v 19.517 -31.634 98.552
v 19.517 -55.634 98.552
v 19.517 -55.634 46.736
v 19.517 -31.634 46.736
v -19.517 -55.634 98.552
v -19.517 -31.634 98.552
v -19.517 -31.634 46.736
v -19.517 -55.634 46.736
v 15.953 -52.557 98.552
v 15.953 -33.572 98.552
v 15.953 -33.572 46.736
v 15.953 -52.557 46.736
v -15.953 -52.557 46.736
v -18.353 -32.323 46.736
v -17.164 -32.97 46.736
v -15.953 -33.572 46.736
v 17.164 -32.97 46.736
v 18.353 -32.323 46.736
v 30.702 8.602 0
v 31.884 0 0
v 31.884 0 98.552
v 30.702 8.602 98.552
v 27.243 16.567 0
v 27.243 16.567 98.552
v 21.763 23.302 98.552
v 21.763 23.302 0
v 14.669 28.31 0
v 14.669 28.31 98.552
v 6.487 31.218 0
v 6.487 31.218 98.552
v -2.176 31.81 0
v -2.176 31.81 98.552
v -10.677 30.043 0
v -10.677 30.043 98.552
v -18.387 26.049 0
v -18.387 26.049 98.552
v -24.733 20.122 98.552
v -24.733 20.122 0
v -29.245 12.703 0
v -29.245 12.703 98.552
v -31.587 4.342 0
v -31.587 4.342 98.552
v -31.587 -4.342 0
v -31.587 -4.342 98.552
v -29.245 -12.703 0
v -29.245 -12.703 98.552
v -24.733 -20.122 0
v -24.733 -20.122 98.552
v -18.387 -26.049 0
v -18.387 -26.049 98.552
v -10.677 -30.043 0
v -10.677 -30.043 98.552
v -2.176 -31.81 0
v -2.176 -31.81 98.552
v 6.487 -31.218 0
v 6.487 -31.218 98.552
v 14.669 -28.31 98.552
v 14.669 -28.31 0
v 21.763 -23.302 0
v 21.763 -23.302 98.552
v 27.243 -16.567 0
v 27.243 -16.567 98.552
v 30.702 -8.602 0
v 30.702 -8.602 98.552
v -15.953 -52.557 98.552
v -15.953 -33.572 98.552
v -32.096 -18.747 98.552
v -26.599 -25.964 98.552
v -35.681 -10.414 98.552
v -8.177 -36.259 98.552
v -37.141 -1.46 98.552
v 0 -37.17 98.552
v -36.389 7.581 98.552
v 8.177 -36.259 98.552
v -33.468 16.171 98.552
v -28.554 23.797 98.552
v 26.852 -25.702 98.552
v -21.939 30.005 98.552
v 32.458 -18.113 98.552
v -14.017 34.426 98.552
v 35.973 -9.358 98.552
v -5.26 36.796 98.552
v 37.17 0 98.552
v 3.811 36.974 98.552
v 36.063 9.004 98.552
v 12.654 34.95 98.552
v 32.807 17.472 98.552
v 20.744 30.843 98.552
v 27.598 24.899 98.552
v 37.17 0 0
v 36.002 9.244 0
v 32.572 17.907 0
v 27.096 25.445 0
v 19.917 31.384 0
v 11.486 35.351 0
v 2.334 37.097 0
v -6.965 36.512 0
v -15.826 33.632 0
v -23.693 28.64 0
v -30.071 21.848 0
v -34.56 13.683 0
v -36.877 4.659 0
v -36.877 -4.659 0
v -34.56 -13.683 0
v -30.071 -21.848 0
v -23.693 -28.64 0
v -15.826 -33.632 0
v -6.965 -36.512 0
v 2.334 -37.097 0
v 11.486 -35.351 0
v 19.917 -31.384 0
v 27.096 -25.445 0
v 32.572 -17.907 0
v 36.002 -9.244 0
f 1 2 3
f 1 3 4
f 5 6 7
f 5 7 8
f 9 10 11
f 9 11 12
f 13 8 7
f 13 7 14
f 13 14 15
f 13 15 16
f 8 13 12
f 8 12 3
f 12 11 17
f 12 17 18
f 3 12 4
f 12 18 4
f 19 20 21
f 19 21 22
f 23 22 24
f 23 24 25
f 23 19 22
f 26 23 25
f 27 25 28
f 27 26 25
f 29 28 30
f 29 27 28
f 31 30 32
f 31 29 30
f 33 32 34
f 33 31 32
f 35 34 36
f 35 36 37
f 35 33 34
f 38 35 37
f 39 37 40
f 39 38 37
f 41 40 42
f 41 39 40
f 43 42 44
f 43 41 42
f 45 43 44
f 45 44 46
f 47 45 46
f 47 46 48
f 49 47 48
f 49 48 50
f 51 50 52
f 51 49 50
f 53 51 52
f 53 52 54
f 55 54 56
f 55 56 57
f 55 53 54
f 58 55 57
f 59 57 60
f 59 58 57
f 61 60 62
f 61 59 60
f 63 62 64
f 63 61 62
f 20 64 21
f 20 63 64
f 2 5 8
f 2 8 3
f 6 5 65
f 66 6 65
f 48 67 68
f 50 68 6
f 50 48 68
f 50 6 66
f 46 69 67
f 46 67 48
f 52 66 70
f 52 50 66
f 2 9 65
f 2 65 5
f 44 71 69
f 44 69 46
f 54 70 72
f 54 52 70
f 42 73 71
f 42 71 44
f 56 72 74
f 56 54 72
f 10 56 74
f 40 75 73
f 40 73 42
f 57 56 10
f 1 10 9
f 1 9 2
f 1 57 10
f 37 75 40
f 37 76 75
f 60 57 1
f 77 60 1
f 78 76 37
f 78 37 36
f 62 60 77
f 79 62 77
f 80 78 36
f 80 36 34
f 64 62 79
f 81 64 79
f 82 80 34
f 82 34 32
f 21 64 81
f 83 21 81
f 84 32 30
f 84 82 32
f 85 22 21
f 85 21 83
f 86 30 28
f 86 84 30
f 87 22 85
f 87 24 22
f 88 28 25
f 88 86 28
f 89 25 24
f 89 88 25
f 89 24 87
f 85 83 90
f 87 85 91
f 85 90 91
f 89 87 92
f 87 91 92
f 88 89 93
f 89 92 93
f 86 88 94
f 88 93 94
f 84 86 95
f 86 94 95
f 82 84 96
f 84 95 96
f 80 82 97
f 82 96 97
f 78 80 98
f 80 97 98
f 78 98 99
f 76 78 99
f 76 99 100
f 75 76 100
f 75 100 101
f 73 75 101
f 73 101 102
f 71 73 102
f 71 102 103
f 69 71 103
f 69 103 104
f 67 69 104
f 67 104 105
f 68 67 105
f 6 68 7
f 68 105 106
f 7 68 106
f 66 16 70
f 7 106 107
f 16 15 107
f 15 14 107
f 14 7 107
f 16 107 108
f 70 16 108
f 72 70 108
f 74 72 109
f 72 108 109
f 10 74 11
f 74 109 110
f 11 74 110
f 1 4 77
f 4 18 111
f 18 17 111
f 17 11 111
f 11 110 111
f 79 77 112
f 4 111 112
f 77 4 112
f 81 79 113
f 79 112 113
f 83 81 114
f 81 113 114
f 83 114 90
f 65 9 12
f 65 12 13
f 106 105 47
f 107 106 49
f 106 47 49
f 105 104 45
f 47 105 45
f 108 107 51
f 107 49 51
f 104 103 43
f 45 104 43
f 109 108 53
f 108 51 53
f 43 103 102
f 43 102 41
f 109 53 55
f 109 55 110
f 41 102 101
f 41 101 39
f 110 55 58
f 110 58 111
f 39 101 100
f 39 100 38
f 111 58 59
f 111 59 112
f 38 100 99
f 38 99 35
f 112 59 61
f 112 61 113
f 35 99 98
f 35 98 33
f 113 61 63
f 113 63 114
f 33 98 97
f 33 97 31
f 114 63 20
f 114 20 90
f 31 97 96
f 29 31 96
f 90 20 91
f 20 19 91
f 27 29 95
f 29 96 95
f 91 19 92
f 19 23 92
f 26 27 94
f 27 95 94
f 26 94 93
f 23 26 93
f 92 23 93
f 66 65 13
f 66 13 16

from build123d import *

# Parameters (mm, degrees)
F0_R     = 37.170022
F0_R_2   = 31.88441
F1_DEPTH = 98.552
F3_DEPTH = 51.816


with BuildPart() as f1:
    # F0 (on Top) → F1 (new body)
    with BuildSketch(Plane.XY):
        Circle(F0_R)
        Circle(F0_R_2, mode=Mode.SUBTRACT)
    extrude(amount=F1_DEPTH)

    # F2 (on face) → F3 (join)
    with BuildSketch(Plane.XY.offset(98.552)):
        with BuildLine():
            Line((-19.516608, -55.634487), (19.516608, -55.634487))
            Line((19.516608, -55.634487), (19.516608, -31.634041))
            ThreePointArc((19.516608, -31.634041), (17.761469, -32.651811), (15.953412, -33.572298))
            Line((15.953412, -33.572298), (15.953412, -52.557178))
            Line((15.953412, -52.557178), (-15.953412, -52.557178))
            Line((-15.953412, -52.557178), (-15.953412, -33.572298))
            ThreePointArc((-15.953412, -33.572298), (-17.761469, -32.651811), (-19.516608, -31.634041))
            Line((-19.516608, -31.634041), (-19.516608, -55.634487))
        make_face()
    extrude(amount=-F3_DEPTH)


solid = f1.part
